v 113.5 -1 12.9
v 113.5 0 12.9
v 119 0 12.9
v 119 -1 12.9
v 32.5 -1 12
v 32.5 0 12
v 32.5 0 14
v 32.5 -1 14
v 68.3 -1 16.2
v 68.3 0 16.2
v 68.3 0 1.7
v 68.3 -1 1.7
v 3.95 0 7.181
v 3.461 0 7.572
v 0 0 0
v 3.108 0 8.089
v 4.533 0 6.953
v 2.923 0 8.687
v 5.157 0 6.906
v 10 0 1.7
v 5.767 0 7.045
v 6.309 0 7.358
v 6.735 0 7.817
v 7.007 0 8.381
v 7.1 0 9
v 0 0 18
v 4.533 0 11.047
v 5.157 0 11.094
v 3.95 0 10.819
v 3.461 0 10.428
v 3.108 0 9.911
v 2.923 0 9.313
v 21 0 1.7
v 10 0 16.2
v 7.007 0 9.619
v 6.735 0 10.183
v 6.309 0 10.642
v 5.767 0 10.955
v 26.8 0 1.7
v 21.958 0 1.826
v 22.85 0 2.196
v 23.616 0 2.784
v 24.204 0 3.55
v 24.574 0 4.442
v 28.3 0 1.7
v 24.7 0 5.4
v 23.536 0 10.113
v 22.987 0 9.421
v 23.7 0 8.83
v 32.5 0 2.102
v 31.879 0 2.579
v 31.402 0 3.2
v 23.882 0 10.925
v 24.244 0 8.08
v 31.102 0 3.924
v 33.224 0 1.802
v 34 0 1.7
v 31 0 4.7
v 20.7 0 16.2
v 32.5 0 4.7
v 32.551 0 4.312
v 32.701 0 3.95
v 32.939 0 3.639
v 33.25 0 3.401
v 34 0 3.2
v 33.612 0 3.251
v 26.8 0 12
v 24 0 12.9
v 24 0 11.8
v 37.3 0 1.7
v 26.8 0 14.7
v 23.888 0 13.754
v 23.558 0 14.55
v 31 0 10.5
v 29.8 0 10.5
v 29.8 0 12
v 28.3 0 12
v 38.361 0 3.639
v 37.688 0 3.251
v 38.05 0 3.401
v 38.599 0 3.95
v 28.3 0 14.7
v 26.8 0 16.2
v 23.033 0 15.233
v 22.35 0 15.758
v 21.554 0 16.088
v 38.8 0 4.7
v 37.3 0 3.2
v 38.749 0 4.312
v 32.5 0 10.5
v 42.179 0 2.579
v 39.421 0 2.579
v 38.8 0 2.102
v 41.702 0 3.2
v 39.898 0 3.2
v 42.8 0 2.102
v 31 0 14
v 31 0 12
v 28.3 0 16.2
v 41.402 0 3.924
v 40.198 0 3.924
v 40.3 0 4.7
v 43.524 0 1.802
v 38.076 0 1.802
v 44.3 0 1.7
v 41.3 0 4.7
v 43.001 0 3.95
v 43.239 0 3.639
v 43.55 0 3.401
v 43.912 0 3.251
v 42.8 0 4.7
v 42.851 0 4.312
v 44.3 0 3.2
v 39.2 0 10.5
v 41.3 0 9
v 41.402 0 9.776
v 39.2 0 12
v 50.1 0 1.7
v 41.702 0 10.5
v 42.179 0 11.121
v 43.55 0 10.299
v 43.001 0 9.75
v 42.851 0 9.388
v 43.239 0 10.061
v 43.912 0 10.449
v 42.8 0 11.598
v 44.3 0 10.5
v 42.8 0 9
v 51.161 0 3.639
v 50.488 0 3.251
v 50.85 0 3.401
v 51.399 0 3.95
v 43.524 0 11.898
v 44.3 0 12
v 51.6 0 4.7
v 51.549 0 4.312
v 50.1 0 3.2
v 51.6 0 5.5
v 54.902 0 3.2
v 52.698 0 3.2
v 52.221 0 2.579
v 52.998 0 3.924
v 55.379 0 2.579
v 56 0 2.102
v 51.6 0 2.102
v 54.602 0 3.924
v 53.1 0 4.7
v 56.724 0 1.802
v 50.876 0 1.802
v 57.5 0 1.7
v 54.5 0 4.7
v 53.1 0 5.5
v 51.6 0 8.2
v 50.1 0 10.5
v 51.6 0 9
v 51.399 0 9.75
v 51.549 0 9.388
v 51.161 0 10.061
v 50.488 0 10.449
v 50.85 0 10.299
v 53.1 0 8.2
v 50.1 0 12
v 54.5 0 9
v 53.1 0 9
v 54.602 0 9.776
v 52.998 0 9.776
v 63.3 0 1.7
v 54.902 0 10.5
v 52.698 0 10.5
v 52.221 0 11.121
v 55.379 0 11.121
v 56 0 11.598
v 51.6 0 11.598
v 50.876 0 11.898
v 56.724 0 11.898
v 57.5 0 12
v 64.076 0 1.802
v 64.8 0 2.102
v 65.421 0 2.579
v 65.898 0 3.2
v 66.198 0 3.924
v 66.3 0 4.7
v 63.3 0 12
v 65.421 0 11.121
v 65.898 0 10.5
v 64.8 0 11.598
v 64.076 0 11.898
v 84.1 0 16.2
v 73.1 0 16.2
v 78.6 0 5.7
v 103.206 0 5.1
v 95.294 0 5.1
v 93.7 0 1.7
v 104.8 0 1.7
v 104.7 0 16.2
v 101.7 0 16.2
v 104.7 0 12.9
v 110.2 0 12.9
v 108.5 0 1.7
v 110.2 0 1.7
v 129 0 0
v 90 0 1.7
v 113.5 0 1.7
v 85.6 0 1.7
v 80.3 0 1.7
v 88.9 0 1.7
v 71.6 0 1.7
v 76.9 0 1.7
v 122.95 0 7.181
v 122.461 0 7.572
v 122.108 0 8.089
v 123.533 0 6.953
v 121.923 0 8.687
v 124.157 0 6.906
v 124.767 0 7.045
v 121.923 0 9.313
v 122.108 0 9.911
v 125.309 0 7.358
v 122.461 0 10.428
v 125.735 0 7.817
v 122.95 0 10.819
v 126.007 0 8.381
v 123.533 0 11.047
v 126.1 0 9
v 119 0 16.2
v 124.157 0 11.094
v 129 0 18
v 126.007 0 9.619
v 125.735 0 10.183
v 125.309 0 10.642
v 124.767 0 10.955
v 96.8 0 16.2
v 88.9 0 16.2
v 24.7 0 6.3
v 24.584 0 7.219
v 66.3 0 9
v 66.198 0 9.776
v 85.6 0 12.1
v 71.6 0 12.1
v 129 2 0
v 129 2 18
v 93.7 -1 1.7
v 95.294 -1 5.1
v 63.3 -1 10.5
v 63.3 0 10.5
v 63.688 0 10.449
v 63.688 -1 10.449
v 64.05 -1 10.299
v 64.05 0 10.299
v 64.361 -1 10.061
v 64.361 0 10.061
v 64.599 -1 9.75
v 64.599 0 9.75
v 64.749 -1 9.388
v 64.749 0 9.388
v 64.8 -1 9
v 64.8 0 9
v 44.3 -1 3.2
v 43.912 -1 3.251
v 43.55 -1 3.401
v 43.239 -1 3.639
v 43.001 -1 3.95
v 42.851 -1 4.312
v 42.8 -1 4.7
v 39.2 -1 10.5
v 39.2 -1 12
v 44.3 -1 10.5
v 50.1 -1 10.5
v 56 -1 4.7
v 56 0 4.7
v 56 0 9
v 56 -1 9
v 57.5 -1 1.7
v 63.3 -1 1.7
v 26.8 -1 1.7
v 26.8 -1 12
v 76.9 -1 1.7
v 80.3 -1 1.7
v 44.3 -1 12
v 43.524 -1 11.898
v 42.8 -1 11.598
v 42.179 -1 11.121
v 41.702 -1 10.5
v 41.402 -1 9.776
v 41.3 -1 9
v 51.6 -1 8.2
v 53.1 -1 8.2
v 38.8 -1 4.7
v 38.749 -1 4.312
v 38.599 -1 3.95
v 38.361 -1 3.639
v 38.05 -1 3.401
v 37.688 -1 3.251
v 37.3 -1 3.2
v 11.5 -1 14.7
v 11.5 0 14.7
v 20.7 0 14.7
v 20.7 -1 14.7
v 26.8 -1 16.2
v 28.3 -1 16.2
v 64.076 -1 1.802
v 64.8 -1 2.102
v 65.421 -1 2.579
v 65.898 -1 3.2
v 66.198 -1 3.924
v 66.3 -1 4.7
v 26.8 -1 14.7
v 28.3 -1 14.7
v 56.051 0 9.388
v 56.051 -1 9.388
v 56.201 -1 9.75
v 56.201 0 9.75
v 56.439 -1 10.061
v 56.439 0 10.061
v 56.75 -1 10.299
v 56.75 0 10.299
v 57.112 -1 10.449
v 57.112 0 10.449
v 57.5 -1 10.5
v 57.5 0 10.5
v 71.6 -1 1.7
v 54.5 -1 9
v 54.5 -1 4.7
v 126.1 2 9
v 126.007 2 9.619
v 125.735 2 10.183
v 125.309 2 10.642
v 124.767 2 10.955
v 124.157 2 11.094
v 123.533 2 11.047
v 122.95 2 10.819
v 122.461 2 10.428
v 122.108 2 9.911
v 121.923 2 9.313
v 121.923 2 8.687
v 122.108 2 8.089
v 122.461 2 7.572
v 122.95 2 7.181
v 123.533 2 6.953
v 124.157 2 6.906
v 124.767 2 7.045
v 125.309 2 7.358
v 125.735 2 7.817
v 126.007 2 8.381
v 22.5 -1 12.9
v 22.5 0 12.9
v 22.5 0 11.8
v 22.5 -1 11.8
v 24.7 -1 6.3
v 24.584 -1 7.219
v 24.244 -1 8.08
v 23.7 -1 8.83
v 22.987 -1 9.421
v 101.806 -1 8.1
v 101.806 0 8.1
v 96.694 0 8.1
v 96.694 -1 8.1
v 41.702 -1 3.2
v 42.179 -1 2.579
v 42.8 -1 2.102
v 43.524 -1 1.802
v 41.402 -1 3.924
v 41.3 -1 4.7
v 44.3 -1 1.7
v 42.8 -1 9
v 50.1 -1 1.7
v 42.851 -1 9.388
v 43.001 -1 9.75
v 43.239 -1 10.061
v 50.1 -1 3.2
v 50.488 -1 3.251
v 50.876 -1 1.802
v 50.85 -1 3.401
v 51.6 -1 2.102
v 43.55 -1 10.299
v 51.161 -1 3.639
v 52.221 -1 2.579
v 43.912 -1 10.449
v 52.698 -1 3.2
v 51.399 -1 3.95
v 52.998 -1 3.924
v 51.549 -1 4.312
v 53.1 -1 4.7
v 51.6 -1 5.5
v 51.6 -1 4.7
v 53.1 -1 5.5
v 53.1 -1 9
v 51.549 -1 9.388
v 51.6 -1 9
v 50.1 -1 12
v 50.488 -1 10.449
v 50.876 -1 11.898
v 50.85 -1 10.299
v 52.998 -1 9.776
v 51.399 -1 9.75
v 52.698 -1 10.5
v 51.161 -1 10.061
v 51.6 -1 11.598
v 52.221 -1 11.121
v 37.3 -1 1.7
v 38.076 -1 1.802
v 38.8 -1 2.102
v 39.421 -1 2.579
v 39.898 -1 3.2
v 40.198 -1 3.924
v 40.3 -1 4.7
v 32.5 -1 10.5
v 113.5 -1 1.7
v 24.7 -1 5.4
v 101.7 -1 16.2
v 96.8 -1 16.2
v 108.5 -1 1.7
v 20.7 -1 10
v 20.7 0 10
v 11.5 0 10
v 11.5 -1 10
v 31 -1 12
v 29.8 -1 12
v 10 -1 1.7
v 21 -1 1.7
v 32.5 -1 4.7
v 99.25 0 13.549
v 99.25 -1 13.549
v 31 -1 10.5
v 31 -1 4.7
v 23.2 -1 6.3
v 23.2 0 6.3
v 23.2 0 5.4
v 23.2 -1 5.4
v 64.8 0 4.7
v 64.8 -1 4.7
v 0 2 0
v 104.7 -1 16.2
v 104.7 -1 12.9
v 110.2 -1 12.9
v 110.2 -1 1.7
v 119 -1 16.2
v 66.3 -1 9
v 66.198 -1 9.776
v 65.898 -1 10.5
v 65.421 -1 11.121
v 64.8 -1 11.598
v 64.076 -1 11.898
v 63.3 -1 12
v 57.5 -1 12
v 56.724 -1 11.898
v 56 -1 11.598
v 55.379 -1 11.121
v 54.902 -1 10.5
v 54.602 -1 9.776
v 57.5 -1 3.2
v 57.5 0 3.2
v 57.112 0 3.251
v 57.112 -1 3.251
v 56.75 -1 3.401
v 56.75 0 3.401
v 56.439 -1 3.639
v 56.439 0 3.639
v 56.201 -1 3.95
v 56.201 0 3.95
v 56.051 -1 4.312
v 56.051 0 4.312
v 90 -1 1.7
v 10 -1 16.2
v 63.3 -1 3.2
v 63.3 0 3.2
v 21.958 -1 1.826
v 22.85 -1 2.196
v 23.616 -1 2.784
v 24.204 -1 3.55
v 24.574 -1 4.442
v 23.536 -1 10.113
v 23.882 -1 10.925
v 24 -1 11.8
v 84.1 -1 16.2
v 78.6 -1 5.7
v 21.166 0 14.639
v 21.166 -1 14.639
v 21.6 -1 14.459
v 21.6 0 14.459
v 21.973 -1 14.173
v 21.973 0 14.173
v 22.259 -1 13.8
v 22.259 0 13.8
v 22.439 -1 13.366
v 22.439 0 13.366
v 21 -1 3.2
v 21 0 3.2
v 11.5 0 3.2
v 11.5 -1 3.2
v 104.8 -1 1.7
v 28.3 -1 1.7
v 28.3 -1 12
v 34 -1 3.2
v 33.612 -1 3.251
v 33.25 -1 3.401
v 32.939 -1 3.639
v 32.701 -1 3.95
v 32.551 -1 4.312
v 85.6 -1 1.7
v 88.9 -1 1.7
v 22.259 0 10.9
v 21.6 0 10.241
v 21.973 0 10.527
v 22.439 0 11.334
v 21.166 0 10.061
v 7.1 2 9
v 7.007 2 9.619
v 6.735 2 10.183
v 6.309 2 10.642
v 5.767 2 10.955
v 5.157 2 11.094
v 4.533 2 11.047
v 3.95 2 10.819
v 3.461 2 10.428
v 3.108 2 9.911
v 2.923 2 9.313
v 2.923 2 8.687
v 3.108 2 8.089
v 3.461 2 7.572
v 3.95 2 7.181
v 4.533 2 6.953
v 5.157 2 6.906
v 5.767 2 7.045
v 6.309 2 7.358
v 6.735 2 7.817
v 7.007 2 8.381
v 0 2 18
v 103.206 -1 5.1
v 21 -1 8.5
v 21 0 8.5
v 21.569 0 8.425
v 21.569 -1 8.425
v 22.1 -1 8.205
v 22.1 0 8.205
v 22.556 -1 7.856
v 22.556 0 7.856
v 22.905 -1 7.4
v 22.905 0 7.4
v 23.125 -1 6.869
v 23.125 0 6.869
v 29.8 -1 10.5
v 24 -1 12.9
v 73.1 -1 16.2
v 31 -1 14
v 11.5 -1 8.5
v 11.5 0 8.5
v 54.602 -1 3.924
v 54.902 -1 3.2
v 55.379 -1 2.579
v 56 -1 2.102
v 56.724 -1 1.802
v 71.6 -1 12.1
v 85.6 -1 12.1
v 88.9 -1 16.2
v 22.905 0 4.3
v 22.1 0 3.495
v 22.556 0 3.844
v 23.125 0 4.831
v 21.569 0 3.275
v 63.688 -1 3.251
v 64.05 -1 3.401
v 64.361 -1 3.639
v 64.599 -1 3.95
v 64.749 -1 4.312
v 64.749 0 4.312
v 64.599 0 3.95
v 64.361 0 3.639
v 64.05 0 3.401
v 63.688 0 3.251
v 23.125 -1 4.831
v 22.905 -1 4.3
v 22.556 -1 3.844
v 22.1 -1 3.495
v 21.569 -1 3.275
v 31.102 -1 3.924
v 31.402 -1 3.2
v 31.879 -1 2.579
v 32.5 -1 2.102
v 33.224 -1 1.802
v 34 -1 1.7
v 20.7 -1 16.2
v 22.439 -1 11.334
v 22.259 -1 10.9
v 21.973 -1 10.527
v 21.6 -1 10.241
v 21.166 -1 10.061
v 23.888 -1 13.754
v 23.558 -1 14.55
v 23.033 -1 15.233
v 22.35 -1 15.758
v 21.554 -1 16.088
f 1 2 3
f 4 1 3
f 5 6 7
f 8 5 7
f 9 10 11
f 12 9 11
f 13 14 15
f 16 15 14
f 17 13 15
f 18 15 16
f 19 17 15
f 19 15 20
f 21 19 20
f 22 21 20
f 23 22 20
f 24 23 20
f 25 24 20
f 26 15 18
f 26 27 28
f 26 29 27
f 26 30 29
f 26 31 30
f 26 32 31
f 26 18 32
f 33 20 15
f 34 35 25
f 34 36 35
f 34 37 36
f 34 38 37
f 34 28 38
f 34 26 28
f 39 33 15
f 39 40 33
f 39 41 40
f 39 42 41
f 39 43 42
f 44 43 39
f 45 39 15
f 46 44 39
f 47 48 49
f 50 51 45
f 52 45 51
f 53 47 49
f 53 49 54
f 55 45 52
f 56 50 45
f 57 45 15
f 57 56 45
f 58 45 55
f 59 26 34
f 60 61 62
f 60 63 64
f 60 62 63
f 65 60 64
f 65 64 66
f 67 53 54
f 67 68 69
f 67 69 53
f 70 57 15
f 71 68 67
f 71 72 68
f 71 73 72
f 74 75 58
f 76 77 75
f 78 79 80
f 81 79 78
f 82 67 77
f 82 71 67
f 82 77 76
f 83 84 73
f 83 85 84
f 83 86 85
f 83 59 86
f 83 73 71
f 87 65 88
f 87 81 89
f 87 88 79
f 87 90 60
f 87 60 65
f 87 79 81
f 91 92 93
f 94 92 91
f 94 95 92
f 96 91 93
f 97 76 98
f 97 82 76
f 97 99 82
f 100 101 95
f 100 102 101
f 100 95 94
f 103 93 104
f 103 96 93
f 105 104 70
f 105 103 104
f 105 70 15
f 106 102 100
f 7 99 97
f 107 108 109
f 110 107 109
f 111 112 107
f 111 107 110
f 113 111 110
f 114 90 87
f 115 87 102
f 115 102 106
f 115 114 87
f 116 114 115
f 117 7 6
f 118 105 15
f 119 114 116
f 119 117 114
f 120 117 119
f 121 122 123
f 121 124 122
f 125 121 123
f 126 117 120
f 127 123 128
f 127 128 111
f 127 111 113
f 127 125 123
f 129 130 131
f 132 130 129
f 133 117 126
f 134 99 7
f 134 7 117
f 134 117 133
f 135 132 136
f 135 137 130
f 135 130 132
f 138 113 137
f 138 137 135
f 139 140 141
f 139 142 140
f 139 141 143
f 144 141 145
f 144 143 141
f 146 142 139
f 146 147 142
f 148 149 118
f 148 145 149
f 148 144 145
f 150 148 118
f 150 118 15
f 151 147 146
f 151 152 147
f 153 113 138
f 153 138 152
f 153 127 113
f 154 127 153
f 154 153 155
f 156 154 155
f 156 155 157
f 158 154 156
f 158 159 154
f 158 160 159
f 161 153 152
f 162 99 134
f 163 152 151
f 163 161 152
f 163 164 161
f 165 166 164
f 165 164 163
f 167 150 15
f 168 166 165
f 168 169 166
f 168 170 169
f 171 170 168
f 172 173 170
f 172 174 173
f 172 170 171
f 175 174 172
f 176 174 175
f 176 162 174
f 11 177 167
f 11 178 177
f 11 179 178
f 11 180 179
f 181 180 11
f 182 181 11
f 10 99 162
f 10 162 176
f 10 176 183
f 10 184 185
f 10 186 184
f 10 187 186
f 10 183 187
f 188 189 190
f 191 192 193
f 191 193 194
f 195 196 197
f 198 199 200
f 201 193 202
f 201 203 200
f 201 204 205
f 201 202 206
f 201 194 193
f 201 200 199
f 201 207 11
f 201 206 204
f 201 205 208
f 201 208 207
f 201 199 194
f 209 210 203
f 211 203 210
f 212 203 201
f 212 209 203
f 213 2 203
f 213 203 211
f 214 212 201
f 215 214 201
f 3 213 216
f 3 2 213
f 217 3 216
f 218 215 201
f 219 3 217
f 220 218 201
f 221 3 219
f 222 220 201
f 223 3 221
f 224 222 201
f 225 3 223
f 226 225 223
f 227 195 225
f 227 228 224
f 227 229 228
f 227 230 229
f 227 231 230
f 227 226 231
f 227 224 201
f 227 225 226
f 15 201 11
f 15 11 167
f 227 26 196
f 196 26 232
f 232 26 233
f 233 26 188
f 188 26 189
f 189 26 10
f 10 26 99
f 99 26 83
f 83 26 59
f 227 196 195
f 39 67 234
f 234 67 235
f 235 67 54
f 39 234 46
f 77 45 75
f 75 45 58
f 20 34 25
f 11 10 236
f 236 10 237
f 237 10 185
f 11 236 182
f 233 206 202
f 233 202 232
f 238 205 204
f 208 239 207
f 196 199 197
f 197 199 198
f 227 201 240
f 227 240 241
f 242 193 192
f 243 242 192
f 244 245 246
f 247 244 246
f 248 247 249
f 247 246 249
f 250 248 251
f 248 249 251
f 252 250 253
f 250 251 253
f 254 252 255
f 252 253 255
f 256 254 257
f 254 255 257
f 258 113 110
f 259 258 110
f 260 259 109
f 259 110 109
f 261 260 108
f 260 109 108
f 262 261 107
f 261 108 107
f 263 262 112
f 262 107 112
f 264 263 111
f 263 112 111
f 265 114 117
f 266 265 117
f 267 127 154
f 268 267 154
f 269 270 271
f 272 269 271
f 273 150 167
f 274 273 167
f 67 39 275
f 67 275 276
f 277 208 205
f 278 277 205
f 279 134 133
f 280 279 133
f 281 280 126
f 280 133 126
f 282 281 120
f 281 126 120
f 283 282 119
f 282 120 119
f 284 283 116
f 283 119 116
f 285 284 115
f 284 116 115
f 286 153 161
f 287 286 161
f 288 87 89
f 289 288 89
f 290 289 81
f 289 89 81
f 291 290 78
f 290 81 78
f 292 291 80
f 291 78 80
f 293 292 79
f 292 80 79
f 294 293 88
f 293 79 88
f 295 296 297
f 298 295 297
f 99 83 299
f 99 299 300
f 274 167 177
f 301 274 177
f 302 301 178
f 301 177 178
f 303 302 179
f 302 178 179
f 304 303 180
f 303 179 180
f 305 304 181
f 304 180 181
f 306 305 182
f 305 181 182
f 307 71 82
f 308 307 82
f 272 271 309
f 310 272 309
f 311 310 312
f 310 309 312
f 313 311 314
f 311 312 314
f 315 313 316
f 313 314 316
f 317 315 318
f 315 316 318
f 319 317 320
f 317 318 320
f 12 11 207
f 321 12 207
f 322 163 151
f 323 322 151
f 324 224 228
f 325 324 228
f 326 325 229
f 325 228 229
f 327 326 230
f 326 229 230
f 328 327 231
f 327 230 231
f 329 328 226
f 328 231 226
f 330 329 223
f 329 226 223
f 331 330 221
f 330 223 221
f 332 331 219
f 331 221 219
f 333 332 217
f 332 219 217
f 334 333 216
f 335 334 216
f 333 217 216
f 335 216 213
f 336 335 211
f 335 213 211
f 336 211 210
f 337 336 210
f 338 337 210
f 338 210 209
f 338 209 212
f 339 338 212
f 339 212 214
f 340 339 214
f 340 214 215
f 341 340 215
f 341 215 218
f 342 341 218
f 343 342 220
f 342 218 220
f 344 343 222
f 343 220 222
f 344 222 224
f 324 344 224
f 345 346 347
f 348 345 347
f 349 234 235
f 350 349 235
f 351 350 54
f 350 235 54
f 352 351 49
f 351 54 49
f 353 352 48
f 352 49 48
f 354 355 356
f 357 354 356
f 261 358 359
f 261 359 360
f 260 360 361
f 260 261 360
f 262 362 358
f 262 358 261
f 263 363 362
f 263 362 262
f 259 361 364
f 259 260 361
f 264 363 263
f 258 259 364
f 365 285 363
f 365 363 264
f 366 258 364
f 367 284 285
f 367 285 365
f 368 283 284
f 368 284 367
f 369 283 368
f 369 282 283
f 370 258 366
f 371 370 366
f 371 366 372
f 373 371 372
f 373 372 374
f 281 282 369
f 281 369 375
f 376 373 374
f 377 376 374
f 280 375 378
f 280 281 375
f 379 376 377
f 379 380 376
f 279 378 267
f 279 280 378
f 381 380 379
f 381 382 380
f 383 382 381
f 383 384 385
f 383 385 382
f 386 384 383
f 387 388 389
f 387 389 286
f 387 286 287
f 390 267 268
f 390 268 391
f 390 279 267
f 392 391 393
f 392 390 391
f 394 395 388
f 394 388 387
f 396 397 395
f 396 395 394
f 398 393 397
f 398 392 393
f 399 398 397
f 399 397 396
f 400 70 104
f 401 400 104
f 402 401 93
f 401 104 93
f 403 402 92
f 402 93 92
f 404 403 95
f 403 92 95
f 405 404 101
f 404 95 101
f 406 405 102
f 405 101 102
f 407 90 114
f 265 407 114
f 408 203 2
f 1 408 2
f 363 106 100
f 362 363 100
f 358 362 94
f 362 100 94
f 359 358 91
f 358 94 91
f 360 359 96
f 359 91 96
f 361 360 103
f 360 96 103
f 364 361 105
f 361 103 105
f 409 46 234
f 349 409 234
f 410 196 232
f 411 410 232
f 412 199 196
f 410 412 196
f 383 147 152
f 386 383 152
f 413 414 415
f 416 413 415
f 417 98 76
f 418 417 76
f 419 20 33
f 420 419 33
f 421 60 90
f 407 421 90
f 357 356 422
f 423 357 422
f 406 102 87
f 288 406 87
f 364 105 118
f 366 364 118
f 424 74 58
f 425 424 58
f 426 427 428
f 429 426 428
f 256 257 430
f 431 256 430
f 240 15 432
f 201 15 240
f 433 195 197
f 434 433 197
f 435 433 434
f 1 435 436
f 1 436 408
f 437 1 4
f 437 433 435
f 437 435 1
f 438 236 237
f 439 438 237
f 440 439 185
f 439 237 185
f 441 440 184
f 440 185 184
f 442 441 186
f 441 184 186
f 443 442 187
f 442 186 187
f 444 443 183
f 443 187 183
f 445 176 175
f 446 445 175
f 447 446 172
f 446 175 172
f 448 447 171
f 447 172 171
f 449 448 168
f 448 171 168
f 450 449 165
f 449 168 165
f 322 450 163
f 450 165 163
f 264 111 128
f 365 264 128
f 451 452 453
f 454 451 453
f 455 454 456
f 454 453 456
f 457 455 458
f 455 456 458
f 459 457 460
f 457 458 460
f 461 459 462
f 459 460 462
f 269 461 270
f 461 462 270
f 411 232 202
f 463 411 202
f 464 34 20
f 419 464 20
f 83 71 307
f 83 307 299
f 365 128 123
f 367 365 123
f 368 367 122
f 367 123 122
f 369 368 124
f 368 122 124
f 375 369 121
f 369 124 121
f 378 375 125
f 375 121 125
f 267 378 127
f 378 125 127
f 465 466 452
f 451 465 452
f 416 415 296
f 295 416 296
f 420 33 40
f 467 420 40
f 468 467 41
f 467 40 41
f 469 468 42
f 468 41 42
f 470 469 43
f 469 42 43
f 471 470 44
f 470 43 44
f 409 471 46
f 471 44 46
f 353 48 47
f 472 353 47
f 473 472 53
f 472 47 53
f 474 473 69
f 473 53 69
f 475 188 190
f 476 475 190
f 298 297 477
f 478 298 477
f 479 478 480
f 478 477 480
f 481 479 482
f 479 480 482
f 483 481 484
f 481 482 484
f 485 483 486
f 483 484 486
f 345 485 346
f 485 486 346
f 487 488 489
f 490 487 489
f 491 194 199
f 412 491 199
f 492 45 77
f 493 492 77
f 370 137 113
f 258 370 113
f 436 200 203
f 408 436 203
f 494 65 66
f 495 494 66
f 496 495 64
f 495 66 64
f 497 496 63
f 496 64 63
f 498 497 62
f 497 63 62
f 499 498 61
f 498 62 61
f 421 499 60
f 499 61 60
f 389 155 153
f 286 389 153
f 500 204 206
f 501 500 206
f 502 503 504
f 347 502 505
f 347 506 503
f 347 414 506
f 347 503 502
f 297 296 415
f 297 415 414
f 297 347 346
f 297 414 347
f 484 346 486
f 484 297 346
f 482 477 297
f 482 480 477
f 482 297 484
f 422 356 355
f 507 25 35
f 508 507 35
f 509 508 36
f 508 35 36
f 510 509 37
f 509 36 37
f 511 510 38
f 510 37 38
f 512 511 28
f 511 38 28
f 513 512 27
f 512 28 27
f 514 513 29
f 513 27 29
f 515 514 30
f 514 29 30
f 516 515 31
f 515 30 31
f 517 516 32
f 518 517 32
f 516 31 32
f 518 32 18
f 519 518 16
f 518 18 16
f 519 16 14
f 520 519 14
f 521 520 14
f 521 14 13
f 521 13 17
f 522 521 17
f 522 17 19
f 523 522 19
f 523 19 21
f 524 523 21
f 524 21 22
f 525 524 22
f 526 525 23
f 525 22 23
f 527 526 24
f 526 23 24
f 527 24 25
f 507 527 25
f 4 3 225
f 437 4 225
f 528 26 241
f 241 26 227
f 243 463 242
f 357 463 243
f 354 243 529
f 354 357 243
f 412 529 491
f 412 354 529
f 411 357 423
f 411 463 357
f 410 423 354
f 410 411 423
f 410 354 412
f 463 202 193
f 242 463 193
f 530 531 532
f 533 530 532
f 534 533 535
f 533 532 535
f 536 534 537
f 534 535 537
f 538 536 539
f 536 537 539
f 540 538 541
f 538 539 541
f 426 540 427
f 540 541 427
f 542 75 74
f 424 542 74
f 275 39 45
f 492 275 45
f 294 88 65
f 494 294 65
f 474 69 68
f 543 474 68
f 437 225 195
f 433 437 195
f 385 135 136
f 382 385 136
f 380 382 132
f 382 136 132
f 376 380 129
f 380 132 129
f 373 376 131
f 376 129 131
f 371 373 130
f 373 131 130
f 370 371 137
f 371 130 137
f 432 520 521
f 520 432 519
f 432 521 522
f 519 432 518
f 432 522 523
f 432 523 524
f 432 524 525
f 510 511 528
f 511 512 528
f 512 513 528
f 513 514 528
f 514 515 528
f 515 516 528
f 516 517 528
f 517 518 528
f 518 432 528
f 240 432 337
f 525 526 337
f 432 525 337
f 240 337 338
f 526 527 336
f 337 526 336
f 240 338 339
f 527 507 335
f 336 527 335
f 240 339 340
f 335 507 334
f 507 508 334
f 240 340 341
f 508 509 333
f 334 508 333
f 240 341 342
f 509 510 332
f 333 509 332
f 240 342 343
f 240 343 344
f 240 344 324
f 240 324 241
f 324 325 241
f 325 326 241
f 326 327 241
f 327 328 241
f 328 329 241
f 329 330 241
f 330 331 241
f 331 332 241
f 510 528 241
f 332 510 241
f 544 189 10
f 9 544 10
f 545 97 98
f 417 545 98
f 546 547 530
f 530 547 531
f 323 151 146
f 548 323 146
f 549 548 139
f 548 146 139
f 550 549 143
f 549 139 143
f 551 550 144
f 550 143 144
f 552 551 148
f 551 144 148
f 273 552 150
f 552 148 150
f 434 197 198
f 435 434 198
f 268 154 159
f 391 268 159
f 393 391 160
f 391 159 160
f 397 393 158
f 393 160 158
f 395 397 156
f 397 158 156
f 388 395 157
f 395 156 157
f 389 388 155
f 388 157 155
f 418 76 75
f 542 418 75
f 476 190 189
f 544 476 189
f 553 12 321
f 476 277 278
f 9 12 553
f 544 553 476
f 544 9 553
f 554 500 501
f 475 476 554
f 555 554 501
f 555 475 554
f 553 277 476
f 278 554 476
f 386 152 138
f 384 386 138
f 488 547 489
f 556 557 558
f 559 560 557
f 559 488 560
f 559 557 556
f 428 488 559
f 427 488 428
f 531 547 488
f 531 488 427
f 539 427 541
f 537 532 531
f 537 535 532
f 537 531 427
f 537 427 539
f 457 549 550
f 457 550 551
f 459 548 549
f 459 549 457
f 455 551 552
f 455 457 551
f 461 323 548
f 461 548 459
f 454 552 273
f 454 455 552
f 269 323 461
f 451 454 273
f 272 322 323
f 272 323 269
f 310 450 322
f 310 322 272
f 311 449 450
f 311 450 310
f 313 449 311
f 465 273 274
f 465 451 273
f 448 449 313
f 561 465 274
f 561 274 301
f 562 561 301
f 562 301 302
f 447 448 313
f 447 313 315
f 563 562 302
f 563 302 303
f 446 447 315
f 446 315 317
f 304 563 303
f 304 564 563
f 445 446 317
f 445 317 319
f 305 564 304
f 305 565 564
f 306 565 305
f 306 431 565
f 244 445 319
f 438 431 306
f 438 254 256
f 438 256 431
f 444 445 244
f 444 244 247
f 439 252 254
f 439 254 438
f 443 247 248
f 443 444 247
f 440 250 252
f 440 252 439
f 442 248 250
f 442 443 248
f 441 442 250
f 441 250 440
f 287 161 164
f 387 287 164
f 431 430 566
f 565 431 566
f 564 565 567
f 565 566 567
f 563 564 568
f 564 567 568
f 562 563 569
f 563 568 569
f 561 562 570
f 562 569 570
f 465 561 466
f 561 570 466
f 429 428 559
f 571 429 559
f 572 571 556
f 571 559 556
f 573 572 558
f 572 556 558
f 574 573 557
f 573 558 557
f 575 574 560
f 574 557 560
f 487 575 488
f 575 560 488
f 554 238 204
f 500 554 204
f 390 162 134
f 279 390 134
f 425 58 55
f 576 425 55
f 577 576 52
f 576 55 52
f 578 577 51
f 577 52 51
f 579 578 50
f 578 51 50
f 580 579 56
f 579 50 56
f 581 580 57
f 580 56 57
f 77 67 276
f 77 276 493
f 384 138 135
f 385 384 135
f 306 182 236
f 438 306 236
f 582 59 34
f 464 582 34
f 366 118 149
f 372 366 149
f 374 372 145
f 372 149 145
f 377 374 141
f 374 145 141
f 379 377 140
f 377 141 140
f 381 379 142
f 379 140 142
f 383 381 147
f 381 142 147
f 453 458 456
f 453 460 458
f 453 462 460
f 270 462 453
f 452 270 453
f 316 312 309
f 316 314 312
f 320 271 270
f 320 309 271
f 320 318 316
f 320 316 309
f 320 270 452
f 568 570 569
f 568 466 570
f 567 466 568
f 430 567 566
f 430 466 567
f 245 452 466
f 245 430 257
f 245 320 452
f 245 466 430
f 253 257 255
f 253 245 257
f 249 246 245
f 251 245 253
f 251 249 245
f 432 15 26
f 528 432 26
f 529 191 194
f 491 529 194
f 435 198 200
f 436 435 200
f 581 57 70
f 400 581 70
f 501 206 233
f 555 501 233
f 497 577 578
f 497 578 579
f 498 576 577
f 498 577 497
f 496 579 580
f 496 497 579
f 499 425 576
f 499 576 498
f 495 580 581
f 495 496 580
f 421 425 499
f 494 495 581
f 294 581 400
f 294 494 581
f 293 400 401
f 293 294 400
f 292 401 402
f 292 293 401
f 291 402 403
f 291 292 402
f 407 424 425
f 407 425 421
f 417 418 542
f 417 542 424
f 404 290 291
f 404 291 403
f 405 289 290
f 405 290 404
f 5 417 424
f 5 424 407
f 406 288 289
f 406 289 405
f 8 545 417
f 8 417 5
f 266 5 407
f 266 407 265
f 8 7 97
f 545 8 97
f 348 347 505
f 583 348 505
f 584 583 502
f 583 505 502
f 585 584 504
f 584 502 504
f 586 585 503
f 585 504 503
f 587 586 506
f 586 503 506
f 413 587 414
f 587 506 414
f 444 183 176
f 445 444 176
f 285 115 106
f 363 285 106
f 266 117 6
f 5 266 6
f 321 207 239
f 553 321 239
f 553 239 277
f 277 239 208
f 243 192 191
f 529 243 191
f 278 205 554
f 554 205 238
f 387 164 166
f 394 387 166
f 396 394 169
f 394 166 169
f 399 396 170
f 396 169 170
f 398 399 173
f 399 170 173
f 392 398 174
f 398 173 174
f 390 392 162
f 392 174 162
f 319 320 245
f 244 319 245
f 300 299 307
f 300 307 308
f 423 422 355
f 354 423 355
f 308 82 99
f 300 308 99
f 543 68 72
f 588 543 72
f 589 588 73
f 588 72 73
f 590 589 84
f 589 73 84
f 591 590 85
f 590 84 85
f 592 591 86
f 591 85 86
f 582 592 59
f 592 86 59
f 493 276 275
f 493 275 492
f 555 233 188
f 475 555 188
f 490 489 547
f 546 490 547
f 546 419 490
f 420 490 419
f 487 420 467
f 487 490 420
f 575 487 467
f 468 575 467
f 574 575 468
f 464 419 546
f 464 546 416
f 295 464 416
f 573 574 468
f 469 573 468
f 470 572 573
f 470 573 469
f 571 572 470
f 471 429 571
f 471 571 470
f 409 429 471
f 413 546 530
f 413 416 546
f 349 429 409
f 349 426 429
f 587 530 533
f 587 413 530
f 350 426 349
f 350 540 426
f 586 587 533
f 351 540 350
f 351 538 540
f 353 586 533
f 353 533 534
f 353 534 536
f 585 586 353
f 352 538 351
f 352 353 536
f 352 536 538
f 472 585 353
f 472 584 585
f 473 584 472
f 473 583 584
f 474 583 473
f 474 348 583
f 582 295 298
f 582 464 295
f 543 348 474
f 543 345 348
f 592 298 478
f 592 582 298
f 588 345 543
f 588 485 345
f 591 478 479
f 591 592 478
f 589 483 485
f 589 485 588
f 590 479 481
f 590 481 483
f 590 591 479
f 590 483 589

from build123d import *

# Parameters (mm, degrees)
F0_W     = 129
F0_H     = 18
F0_W_2   = 1.5
F0_H_2   = 10.3
F0_R     = 2.1
F0_H_3   = 1.5
F1_DEPTH = 2
F2_DEPTH = 1


with BuildPart() as f1:
    # F0 (on Front) → F1 (new body)
    with BuildSketch(Plane.XZ):
        with Locations((64.5, 9)):
            Rectangle(F0_W, F0_H)
        with Locations((27.55, 6.85)):
            Rectangle(F0_W_2, F0_H_2, mode=Mode.SUBTRACT)
        with BuildLine():
            Line((10, 1.7), (10, 16.2))
            Line((10, 16.2), (20.7, 16.2))
            ThreePointArc((20.7, 16.2), (23.0334523779, 15.2334523779), (24, 12.9))
            Line((24, 12.9), (24, 11.8))
            ThreePointArc((24, 11.8), (23.7362385725, 10.5072295908), (22.9871179813, 9.4211155263))
            ThreePointArc((22.9871179813, 9.4211155263), (24.2436350389, 8.0801212696), (24.7, 6.3))
            Line((24.7, 6.3), (24.7, 5.4))
            ThreePointArc((24.7, 5.4), (23.6162950904, 2.7837049096), (21, 1.7))
            Line((21, 1.7), (10, 1.7))
        make_face(mode=Mode.SUBTRACT)
        with BuildLine():
            Line((32.5, 10.5), (32.5, 4.7))
            ThreePointArc((32.5, 4.7), (32.9393398282, 3.6393398282), (34, 3.2))
            Line((34, 3.2), (37.3, 3.2))
            ThreePointArc((37.3, 3.2), (38.3606601718, 3.6393398282), (38.8, 4.7))
            Line((38.8, 4.7), (40.3, 4.7))
            ThreePointArc((40.3, 4.7), (39.4213203436, 2.5786796564), (37.3, 1.7))
            Line((37.3, 1.7), (34, 1.7))
            ThreePointArc((34, 1.7), (31.8786796564, 2.5786796564), (31, 4.7))
            Line((31, 4.7), (31, 10.5))
            Line((31, 10.5), (29.8, 10.5))
            Line((29.8, 10.5), (29.8, 12))
            Line((29.8, 12), (31, 12))
            Line((31, 12), (31, 14))
            Line((31, 14), (32.5, 14))
            Line((32.5, 14), (32.5, 12))
            Line((32.5, 12), (39.2, 12))
            Line((39.2, 12), (39.2, 10.5))
            Line((39.2, 10.5), (32.5, 10.5))
        make_face(mode=Mode.SUBTRACT)
        with BuildLine():
            Line((50.1, 10.5), (44.3, 10.5))
            ThreePointArc((44.3, 10.5), (43.2393398282, 10.0606601718), (42.8, 9))
            Line((42.8, 9), (42.8, 4.7))
            ThreePointArc((42.8, 4.7), (43.2393398282, 3.6393398282), (44.3, 3.2))
            Line((44.3, 3.2), (50.1, 3.2))
            ThreePointArc((50.1, 3.2), (51.1606601718, 3.6393398282), (51.6, 4.7))
            Line((51.6, 4.7), (51.6, 5.5))
            Line((51.6, 5.5), (53.1, 5.5))
            Line((53.1, 5.5), (53.1, 4.7))
            ThreePointArc((53.1, 4.7), (52.2213203436, 2.5786796564), (50.1, 1.7))
            Line((50.1, 1.7), (44.3, 1.7))
            ThreePointArc((44.3, 1.7), (42.1786796564, 2.5786796564), (41.3, 4.7))
            Line((41.3, 4.7), (41.3, 9))
            ThreePointArc((41.3, 9), (42.1786796564, 11.1213203436), (44.3, 12))
            Line((44.3, 12), (50.1, 12))
            ThreePointArc((50.1, 12), (52.2213203436, 11.1213203436), (53.1, 9))
            Line((53.1, 9), (53.1, 8.2))
            Line((53.1, 8.2), (51.6, 8.2))
            Line((51.6, 8.2), (51.6, 9))
            ThreePointArc((51.6, 9), (51.1606601718, 10.0606601718), (50.1, 10.5))
        make_face(mode=Mode.SUBTRACT)
        with BuildLine():
            ThreePointArc((54.5, 9), (55.3786796564, 11.1213203436), (57.5, 12))
            Line((57.5, 12), (63.3, 12))
            ThreePointArc((63.3, 12), (65.4213203436, 11.1213203436), (66.3, 9))
            Line((66.3, 9), (66.3, 4.7))
            ThreePointArc((66.3, 4.7), (65.4213203436, 2.5786796564), (63.3, 1.7))
            Line((63.3, 1.7), (57.5, 1.7))
            ThreePointArc((57.5, 1.7), (55.3786796564, 2.5786796564), (54.5, 4.7))
            Line((54.5, 4.7), (54.5, 9))
        make_face(mode=Mode.SUBTRACT)
        Polygon((71.6, 12.1), (71.6, 1.7), (68.3, 1.7), (68.3, 16.2), (73.1, 16.2), (78.6, 5.7), (84.1, 16.2), (88.9, 16.2), (88.9, 1.7), (85.6, 1.7), (85.6, 12.1), (80.3, 1.7), (76.9, 1.7), align=None, mode=Mode.SUBTRACT)
        Polygon((93.7, 1.7), (90, 1.7), (96.8, 16.2), (101.7, 16.2), (108.5, 1.7), (104.8, 1.7), (103.2055172414, 5.1), (95.2944827586, 5.1), align=None, mode=Mode.SUBTRACT)
        Polygon((104.7, 12.9), (104.7, 16.2), (119, 16.2), (119, 12.9), (113.5, 12.9), (113.5, 1.7), (110.2, 1.7), (110.2, 12.9), align=None, mode=Mode.SUBTRACT)
        with Locations((5, 9)):
            Circle(F0_R, mode=Mode.SUBTRACT)
        with Locations((27.55, 15.45)):
            Rectangle(F0_W_2, F0_H_3, mode=Mode.SUBTRACT)
        with Locations((124, 9)):
            Circle(F0_R, mode=Mode.SUBTRACT)
        with BuildLine():
            Line((20.7, 16.2), (10, 16.2))
            Line((10, 16.2), (10, 1.7))
            Line((10, 1.7), (21, 1.7))
            ThreePointArc((21, 1.7), (23.6162950904, 2.7837049096), (24.7, 5.4))
            Line((24.7, 5.4), (24.7, 6.3))
            ThreePointArc((24.7, 6.3), (24.2436350389, 8.0801212696), (22.9871179813, 9.4211155263))
            ThreePointArc((22.9871179813, 9.4211155263), (23.7362385725, 10.5072295908), (24, 11.8))
            Line((24, 11.8), (24, 12.9))
            ThreePointArc((24, 12.9), (23.0334523779, 15.2334523779), (20.7, 16.2))
        make_face()
        with BuildLine():
            Line((11.5, 8.5), (21, 8.5))
            ThreePointArc((21, 8.5), (22.5556349186, 7.8556349186), (23.2, 6.3))
            Line((23.2, 6.3), (23.2, 5.4))
            ThreePointArc((23.2, 5.4), (22.5556349186, 3.8443650814), (21, 3.2))
            Line((21, 3.2), (11.5, 3.2))
            Line((11.5, 3.2), (11.5, 8.5))
        make_face(mode=Mode.SUBTRACT)
        with BuildLine():
            Line((11.5, 14.7), (20.7, 14.7))
            ThreePointArc((20.7, 14.7), (21.9727922061, 14.1727922061), (22.5, 12.9))
            Line((22.5, 12.9), (22.5, 11.8))
            ThreePointArc((22.5, 11.8), (21.9727922061, 10.5272077939), (20.7, 10))
            Line((20.7, 10), (11.5, 10))
            Line((11.5, 10), (11.5, 14.7))
        make_face(mode=Mode.SUBTRACT)
        Polygon((68.3, 1.7), (71.6, 1.7), (71.6, 12.1), (76.9, 1.7), (80.3, 1.7), (85.6, 12.1), (85.6, 1.7), (88.9, 1.7), (88.9, 16.2), (84.1, 16.2), (78.6, 5.7), (73.1, 16.2), (68.3, 16.2), align=None)
        Polygon((96.8, 16.2), (90, 1.7), (93.7, 1.7), (95.2944827586, 5.1), (103.2055172414, 5.1), (104.8, 1.7), (108.5, 1.7), (101.7, 16.2), align=None)
        Polygon((99.25, 13.5492647059), (101.8055172414, 8.1), (96.6944827586, 8.1), align=None, mode=Mode.SUBTRACT)
        with BuildLine():
            Line((63.3, 12), (57.5, 12))
            ThreePointArc((57.5, 12), (55.3786796564, 11.1213203436), (54.5, 9))
            Line((54.5, 9), (54.5, 4.7))
            ThreePointArc((54.5, 4.7), (55.3786796564, 2.5786796564), (57.5, 1.7))
            Line((57.5, 1.7), (63.3, 1.7))
            ThreePointArc((63.3, 1.7), (65.4213203436, 2.5786796564), (66.3, 4.7))
            Line((66.3, 4.7), (66.3, 9))
            ThreePointArc((66.3, 9), (65.4213203436, 11.1213203436), (63.3, 12))
        make_face()
        with BuildLine():
            ThreePointArc((56, 9), (56.4393398282, 10.0606601718), (57.5, 10.5))
            Line((57.5, 10.5), (63.3, 10.5))
            ThreePointArc((63.3, 10.5), (64.3606601718, 10.0606601718), (64.8, 9))
            Line((64.8, 9), (64.8, 4.7))
            ThreePointArc((64.8, 4.7), (64.3606601718, 3.6393398282), (63.3, 3.2))
            Line((63.3, 3.2), (57.5, 3.2))
            ThreePointArc((57.5, 3.2), (56.4393398282, 3.6393398282), (56, 4.7))
            Line((56, 4.7), (56, 9))
        make_face(mode=Mode.SUBTRACT)
        Polygon((119, 16.2), (104.7, 16.2), (104.7, 12.9), (110.2, 12.9), (110.2, 1.7), (113.5, 1.7), (113.5, 12.9), (119, 12.9), align=None)
        with BuildLine():
            Line((63.3, 10.5), (57.5, 10.5))
            ThreePointArc((57.5, 10.5), (56.4393398282, 10.0606601718), (56, 9))
            Line((56, 9), (56, 4.7))
            ThreePointArc((56, 4.7), (56.4393398282, 3.6393398282), (57.5, 3.2))
            Line((57.5, 3.2), (63.3, 3.2))
            ThreePointArc((63.3, 3.2), (64.3606601718, 3.6393398282), (64.8, 4.7))
            Line((64.8, 4.7), (64.8, 9))
            ThreePointArc((64.8, 9), (64.3606601718, 10.0606601718), (63.3, 10.5))
        make_face()
        with BuildLine():
            ThreePointArc((23.2, 6.3), (22.5556349186, 7.8556349186), (21, 8.5))
            Line((21, 8.5), (11.5, 8.5))
            Line((11.5, 8.5), (11.5, 3.2))
            Line((11.5, 3.2), (21, 3.2))
            ThreePointArc((21, 3.2), (22.5556349186, 3.8443650814), (23.2, 5.4))
            Line((23.2, 5.4), (23.2, 6.3))
        make_face()
        with BuildLine():
            ThreePointArc((22.5, 12.9), (21.9727922061, 14.1727922061), (20.7, 14.7))
            Line((20.7, 14.7), (11.5, 14.7))
            Line((11.5, 14.7), (11.5, 10))
            Line((11.5, 10), (20.7, 10))
            ThreePointArc((20.7, 10), (21.9727922061, 10.5272077939), (22.5, 11.8))
            Line((22.5, 11.8), (22.5, 12.9))
        make_face()
        with BuildLine():
            ThreePointArc((42.8, 9), (43.2393398282, 10.0606601718), (44.3, 10.5))
            Line((44.3, 10.5), (50.1, 10.5))
            ThreePointArc((50.1, 10.5), (51.1606601718, 10.0606601718), (51.6, 9))
            Line((51.6, 9), (51.6, 8.2))
            Line((51.6, 8.2), (53.1, 8.2))
            Line((53.1, 8.2), (53.1, 9))
            ThreePointArc((53.1, 9), (52.2213203436, 11.1213203436), (50.1, 12))
            Line((50.1, 12), (44.3, 12))
            ThreePointArc((44.3, 12), (42.1786796564, 11.1213203436), (41.3, 9))
            Line((41.3, 9), (41.3, 4.7))
            ThreePointArc((41.3, 4.7), (42.1786796564, 2.5786796564), (44.3, 1.7))
            Line((44.3, 1.7), (50.1, 1.7))
            ThreePointArc((50.1, 1.7), (52.2213203436, 2.5786796564), (53.1, 4.7))
            Line((53.1, 4.7), (53.1, 5.5))
            Line((53.1, 5.5), (51.6, 5.5))
            Line((51.6, 5.5), (51.6, 4.7))
            ThreePointArc((51.6, 4.7), (51.1606601718, 3.6393398282), (50.1, 3.2))
            Line((50.1, 3.2), (44.3, 3.2))
            ThreePointArc((44.3, 3.2), (43.2393398282, 3.6393398282), (42.8, 4.7))
            Line((42.8, 4.7), (42.8, 9))
        make_face()
        with BuildLine():
            ThreePointArc((34, 3.2), (32.9393398282, 3.6393398282), (32.5, 4.7))
            Line((32.5, 4.7), (32.5, 10.5))
            Line((32.5, 10.5), (39.2, 10.5))
            Line((39.2, 10.5), (39.2, 12))
            Line((39.2, 12), (32.5, 12))
            Line((32.5, 12), (32.5, 14))
            Line((32.5, 14), (31, 14))
            Line((31, 14), (31, 12))
            Line((31, 12), (29.8, 12))
            Line((29.8, 12), (29.8, 10.5))
            Line((29.8, 10.5), (31, 10.5))
            Line((31, 10.5), (31, 4.7))
            ThreePointArc((31, 4.7), (31.8786796564, 2.5786796564), (34, 1.7))
            Line((34, 1.7), (37.3, 1.7))
            ThreePointArc((37.3, 1.7), (39.4213203436, 2.5786796564), (40.3, 4.7))
            Line((40.3, 4.7), (38.8, 4.7))
            ThreePointArc((38.8, 4.7), (38.3606601718, 3.6393398282), (37.3, 3.2))
            Line((37.3, 3.2), (34, 3.2))
        make_face()
        with Locations((27.55, 6.85)):
            Rectangle(F0_W_2, F0_H_2)
        Polygon((96.6944827586, 8.1), (101.8055172414, 8.1), (99.25, 13.5492647059), align=None)
        with Locations((27.55, 15.45)):
            Rectangle(F0_W_2, F0_H_3)
    extrude(amount=-F1_DEPTH)

    # F0 (on Front) → F2 (join)
    with BuildSketch(Plane.XZ):
        with BuildLine():
            Line((20.7, 16.2), (10, 16.2))
            Line((10, 16.2), (10, 1.7))
            Line((10, 1.7), (21, 1.7))
            ThreePointArc((21, 1.7), (23.6162950904, 2.7837049096), (24.7, 5.4))
            Line((24.7, 5.4), (24.7, 6.3))
            ThreePointArc((24.7, 6.3), (24.2436350389, 8.0801212696), (22.9871179813, 9.4211155263))
            ThreePointArc((22.9871179813, 9.4211155263), (23.7362385725, 10.5072295908), (24, 11.8))
            Line((24, 11.8), (24, 12.9))
            ThreePointArc((24, 12.9), (23.0334523779, 15.2334523779), (20.7, 16.2))
        make_face()
        with BuildLine():
            Line((11.5, 8.5), (21, 8.5))
            ThreePointArc((21, 8.5), (22.5556349186, 7.8556349186), (23.2, 6.3))
            Line((23.2, 6.3), (23.2, 5.4))
            ThreePointArc((23.2, 5.4), (22.5556349186, 3.8443650814), (21, 3.2))
            Line((21, 3.2), (11.5, 3.2))
            Line((11.5, 3.2), (11.5, 8.5))
        make_face(mode=Mode.SUBTRACT)
        with BuildLine():
            Line((11.5, 14.7), (20.7, 14.7))
            ThreePointArc((20.7, 14.7), (21.9727922061, 14.1727922061), (22.5, 12.9))
            Line((22.5, 12.9), (22.5, 11.8))
            ThreePointArc((22.5, 11.8), (21.9727922061, 10.5272077939), (20.7, 10))
            Line((20.7, 10), (11.5, 10))
            Line((11.5, 10), (11.5, 14.7))
        make_face(mode=Mode.SUBTRACT)
        with Locations((27.55, 6.85)):
            Rectangle(F0_W_2, F0_H_2)
        with Locations((27.55, 15.45)):
            Rectangle(F0_W_2, F0_H_3)
        with BuildLine():
            ThreePointArc((34, 3.2), (32.9393398282, 3.6393398282), (32.5, 4.7))
            Line((32.5, 4.7), (32.5, 10.5))
            Line((32.5, 10.5), (39.2, 10.5))
            Line((39.2, 10.5), (39.2, 12))
            Line((39.2, 12), (32.5, 12))
            Line((32.5, 12), (32.5, 14))
            Line((32.5, 14), (31, 14))
            Line((31, 14), (31, 12))
            Line((31, 12), (29.8, 12))
            Line((29.8, 12), (29.8, 10.5))
            Line((29.8, 10.5), (31, 10.5))
            Line((31, 10.5), (31, 4.7))
            ThreePointArc((31, 4.7), (31.8786796564, 2.5786796564), (34, 1.7))
            Line((34, 1.7), (37.3, 1.7))
            ThreePointArc((37.3, 1.7), (39.4213203436, 2.5786796564), (40.3, 4.7))
            Line((40.3, 4.7), (38.8, 4.7))
            ThreePointArc((38.8, 4.7), (38.3606601718, 3.6393398282), (37.3, 3.2))
            Line((37.3, 3.2), (34, 3.2))
        make_face()
        with BuildLine():
            ThreePointArc((42.8, 9), (43.2393398282, 10.0606601718), (44.3, 10.5))
            Line((44.3, 10.5), (50.1, 10.5))
            ThreePointArc((50.1, 10.5), (51.1606601718, 10.0606601718), (51.6, 9))
            Line((51.6, 9), (51.6, 8.2))
            Line((51.6, 8.2), (53.1, 8.2))
            Line((53.1, 8.2), (53.1, 9))
            ThreePointArc((53.1, 9), (52.2213203436, 11.1213203436), (50.1, 12))
            Line((50.1, 12), (44.3, 12))
            ThreePointArc((44.3, 12), (42.1786796564, 11.1213203436), (41.3, 9))
            Line((41.3, 9), (41.3, 4.7))
            ThreePointArc((41.3, 4.7), (42.1786796564, 2.5786796564), (44.3, 1.7))
            Line((44.3, 1.7), (50.1, 1.7))
            ThreePointArc((50.1, 1.7), (52.2213203436, 2.5786796564), (53.1, 4.7))
            Line((53.1, 4.7), (53.1, 5.5))
            Line((53.1, 5.5), (51.6, 5.5))
            Line((51.6, 5.5), (51.6, 4.7))
            ThreePointArc((51.6, 4.7), (51.1606601718, 3.6393398282), (50.1, 3.2))
            Line((50.1, 3.2), (44.3, 3.2))
            ThreePointArc((44.3, 3.2), (43.2393398282, 3.6393398282), (42.8, 4.7))
            Line((42.8, 4.7), (42.8, 9))
        make_face()
        with BuildLine():
            Line((63.3, 12), (57.5, 12))
            ThreePointArc((57.5, 12), (55.3786796564, 11.1213203436), (54.5, 9))
            Line((54.5, 9), (54.5, 4.7))
            ThreePointArc((54.5, 4.7), (55.3786796564, 2.5786796564), (57.5, 1.7))
            Line((57.5, 1.7), (63.3, 1.7))
            ThreePointArc((63.3, 1.7), (65.4213203436, 2.5786796564), (66.3, 4.7))
            Line((66.3, 4.7), (66.3, 9))
            ThreePointArc((66.3, 9), (65.4213203436, 11.1213203436), (63.3, 12))
        make_face()
        with BuildLine():
            ThreePointArc((56, 9), (56.4393398282, 10.0606601718), (57.5, 10.5))
            Line((57.5, 10.5), (63.3, 10.5))
            ThreePointArc((63.3, 10.5), (64.3606601718, 10.0606601718), (64.8, 9))
            Line((64.8, 9), (64.8, 4.7))
            ThreePointArc((64.8, 4.7), (64.3606601718, 3.6393398282), (63.3, 3.2))
            Line((63.3, 3.2), (57.5, 3.2))
            ThreePointArc((57.5, 3.2), (56.4393398282, 3.6393398282), (56, 4.7))
            Line((56, 4.7), (56, 9))
        make_face(mode=Mode.SUBTRACT)
        Polygon((68.3, 1.7), (71.6, 1.7), (71.6, 12.1), (76.9, 1.7), (80.3, 1.7), (85.6, 12.1), (85.6, 1.7), (88.9, 1.7), (88.9, 16.2), (84.1, 16.2), (78.6, 5.7), (73.1, 16.2), (68.3, 16.2), align=None)
        Polygon((96.8, 16.2), (90, 1.7), (93.7, 1.7), (95.2944827586, 5.1), (103.2055172414, 5.1), (104.8, 1.7), (108.5, 1.7), (101.7, 16.2), align=None)
        Polygon((99.25, 13.5492647059), (101.8055172414, 8.1), (96.6944827586, 8.1), align=None, mode=Mode.SUBTRACT)
        Polygon((119, 16.2), (104.7, 16.2), (104.7, 12.9), (110.2, 12.9), (110.2, 1.7), (113.5, 1.7), (113.5, 12.9), (119, 12.9), align=None)
    extrude(amount=F2_DEPTH)


solid = f1.part
